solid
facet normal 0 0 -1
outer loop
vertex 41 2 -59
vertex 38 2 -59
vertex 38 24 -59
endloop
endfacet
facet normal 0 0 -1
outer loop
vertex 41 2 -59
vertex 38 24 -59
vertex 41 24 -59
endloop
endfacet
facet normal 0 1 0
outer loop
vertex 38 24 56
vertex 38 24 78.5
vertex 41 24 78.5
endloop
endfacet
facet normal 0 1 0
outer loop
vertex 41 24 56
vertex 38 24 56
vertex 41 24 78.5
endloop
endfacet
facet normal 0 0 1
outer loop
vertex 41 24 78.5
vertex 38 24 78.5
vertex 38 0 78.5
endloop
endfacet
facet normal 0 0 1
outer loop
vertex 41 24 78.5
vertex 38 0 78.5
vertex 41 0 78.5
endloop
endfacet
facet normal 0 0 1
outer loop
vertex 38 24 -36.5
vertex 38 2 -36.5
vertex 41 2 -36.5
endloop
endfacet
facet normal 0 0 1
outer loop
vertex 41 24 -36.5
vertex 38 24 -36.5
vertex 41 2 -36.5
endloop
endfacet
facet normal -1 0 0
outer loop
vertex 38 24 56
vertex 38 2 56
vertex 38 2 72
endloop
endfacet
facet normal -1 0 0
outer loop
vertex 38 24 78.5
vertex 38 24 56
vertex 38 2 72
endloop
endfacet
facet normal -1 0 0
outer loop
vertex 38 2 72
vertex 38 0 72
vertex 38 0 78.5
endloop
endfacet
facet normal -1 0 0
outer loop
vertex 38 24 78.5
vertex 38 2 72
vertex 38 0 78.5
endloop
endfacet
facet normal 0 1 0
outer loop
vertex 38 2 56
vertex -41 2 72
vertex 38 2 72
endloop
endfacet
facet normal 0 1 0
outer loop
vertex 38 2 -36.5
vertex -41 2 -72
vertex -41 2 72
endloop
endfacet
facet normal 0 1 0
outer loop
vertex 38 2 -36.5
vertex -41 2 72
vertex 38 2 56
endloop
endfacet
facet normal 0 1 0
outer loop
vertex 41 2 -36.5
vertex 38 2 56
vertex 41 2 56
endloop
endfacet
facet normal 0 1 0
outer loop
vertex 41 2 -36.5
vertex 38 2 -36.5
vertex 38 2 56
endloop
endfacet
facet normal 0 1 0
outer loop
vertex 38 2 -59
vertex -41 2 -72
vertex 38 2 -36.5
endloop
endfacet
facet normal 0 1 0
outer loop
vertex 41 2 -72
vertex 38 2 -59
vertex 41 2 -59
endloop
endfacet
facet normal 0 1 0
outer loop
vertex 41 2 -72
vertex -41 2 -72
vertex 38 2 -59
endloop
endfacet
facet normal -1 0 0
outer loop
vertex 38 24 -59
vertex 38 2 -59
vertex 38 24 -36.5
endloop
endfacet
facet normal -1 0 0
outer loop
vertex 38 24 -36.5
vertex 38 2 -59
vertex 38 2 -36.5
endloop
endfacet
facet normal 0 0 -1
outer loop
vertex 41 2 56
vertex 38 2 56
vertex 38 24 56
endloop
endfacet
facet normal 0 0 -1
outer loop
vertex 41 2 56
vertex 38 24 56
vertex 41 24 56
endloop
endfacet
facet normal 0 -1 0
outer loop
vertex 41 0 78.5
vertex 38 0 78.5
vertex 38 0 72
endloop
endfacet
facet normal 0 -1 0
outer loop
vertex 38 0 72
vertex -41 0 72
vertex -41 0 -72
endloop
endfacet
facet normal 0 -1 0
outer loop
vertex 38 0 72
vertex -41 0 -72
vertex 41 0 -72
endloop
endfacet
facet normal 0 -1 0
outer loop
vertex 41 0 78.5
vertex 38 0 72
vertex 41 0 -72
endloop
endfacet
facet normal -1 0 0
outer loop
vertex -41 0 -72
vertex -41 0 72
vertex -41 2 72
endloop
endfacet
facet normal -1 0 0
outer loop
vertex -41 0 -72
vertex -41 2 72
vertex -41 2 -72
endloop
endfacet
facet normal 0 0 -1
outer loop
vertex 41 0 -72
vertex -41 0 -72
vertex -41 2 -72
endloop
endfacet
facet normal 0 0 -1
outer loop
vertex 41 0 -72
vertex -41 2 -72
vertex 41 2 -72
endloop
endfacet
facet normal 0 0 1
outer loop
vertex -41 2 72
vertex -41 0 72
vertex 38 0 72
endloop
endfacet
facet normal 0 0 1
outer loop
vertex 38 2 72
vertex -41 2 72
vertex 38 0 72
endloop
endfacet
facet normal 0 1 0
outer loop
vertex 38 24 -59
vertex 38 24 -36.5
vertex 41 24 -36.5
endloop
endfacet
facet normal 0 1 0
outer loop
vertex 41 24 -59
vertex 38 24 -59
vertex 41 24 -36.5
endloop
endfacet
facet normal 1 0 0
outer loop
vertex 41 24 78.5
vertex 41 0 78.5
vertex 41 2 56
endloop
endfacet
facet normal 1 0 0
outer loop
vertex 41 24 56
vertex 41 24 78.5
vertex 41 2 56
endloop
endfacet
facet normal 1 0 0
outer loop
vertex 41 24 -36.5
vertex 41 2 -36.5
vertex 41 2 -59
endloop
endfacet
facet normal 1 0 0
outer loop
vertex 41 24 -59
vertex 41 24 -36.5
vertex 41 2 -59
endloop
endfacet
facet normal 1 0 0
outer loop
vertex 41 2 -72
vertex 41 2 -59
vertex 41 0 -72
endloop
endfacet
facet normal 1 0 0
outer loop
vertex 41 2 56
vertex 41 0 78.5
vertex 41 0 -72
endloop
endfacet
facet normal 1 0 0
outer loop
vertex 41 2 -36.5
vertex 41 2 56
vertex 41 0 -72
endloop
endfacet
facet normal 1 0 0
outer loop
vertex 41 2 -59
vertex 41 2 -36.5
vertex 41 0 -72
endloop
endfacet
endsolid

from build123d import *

# Parameters (mm, degrees)
CROQUIS1_W              = 82
CROQUIS1_H              = 144
SALIENTE_EXTRUIR1_DEPTH = 2
CROQUIS2_W              = 3
CROQUIS2_H              = 22.5
SALIENTE_EXTRUIR4_DEPTH = 24


with BuildPart() as part:
    # Croquis1 → Saliente-Extruir1 (new body)
    with BuildSketch(Plane(origin=(0, 0, 0), x_dir=(1, 0, 0), z_dir=(0, 1, 0))):
        Rectangle(CROQUIS1_W, CROQUIS1_H)
    extrude(amount=SALIENTE_EXTRUIR1_DEPTH)

    # Croquis2 → Saliente-Extruir4 (add)
    with BuildSketch(Plane.XZ):
        with Locations((39.5, 67.25)):
            Rectangle(CROQUIS2_W, CROQUIS2_H)
        with Locations((39.5, -47.75)):
            Rectangle(CROQUIS2_W, CROQUIS2_H)
    extrude(amount=-SALIENTE_EXTRUIR4_DEPTH)


solid = part.part
